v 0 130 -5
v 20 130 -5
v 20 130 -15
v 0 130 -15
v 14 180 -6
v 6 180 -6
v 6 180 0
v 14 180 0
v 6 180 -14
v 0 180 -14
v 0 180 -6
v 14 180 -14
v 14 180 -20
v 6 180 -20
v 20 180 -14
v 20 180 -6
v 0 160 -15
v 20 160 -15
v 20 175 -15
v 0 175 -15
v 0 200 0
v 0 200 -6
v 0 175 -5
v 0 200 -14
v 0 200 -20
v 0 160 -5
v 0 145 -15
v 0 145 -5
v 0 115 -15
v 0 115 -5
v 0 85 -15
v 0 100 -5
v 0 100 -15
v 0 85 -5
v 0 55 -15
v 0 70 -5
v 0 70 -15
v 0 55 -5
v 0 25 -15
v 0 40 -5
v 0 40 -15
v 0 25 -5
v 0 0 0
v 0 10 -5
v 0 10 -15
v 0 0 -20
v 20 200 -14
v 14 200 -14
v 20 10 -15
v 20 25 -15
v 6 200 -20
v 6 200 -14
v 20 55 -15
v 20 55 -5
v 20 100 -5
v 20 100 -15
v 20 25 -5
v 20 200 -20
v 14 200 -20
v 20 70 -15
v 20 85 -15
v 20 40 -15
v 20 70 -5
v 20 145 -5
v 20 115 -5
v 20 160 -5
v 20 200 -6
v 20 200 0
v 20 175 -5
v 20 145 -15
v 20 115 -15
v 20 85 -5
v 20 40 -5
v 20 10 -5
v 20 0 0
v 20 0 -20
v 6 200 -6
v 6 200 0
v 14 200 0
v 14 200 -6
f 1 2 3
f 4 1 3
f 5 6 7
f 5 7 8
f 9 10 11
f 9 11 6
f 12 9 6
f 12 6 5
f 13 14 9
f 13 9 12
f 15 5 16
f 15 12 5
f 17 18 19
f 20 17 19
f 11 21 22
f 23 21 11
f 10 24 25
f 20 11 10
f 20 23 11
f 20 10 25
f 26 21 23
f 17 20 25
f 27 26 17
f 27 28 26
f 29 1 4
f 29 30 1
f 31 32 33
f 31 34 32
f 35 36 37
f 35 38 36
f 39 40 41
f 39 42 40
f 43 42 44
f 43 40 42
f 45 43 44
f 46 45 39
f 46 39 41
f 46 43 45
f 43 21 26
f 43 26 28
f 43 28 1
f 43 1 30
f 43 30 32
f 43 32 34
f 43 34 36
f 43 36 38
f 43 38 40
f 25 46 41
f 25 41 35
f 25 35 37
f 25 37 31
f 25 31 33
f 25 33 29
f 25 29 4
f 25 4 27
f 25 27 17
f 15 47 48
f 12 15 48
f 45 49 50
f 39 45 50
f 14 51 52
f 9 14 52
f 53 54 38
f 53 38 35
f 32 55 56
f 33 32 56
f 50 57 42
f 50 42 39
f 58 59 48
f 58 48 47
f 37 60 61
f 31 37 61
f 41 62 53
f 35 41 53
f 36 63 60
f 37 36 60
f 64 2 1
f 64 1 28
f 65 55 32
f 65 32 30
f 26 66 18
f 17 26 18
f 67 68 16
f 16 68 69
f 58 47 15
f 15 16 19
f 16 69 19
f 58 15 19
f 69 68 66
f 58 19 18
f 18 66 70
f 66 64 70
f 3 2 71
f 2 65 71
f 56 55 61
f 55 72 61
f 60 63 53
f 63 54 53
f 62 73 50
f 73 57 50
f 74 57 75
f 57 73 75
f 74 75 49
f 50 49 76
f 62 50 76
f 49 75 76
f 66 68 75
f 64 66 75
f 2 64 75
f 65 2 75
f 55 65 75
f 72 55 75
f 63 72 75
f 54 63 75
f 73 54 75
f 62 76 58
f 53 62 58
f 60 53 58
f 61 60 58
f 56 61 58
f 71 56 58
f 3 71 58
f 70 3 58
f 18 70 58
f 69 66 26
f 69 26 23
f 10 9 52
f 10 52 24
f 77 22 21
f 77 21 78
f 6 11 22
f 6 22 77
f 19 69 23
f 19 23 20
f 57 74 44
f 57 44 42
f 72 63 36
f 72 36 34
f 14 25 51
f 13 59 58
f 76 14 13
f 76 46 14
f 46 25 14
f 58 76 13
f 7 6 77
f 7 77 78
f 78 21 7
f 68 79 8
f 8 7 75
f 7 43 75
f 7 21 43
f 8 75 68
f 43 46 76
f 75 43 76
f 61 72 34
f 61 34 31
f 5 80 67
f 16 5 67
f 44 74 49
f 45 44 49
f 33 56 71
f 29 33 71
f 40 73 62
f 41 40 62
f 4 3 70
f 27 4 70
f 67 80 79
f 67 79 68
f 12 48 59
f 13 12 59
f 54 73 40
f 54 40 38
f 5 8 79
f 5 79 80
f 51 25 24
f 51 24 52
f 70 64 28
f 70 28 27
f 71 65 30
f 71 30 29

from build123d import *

# Parameters (mm, degrees)
SKETCH4_W           = 20
SKETCH4_H           = 20
BOSS_EXTRUDE2_DEPTH = 200
CUT_EXTRUDE3_DEPTH  = 20
SKETCH6_W           = 10
SKETCH6_H           = 15
CUT_EXTRUDE5_DEPTH  = 21


with BuildPart() as part:
    # Sketch4 → Boss-Extrude2 (new body)
    with BuildSketch(Plane(origin=(0, 0, 0), x_dir=(1, 0, 0), z_dir=(0, 1, 0))):
        with Locations((10, 10)):
            Rectangle(SKETCH4_W, SKETCH4_H)
    extrude(amount=BOSS_EXTRUDE2_DEPTH)

    # Sketch5 → Cut-Extrude3 (cut)
    with BuildSketch(Plane(origin=(0, 200, 0), x_dir=(1, 0, 0), z_dir=(0, 1, 0))):
        Polygon((14, 20), (6, 20), (6, 14), (0, 14), (0, 6), (6, 6), (6, 0), (14, 0), (14, 6), (20, 6), (20, 14), (14, 14), align=None)
    extrude(amount=-CUT_EXTRUDE3_DEPTH, mode=Mode.SUBTRACT)

    # Sketch6 → Cut-Extrude5 (cut, through all)
    with BuildSketch(Plane(origin=(20, 0, 0), x_dir=(0, 0, -1), z_dir=(1, 0, 0))):
        with Locations((10, 17.5)):
            Rectangle(SKETCH6_W, SKETCH6_H)
        with Locations((10, 47.5)):
            Rectangle(SKETCH6_W, SKETCH6_H)
        with Locations((10, 77.5)):
            Rectangle(SKETCH6_W, SKETCH6_H)
        with Locations((10, 107.5)):
            Rectangle(SKETCH6_W, SKETCH6_H)
        with Locations((10, 137.5)):
            Rectangle(SKETCH6_W, SKETCH6_H)
        with Locations((10, 167.5)):
            Rectangle(SKETCH6_W, SKETCH6_H)
    extrude(amount=-CUT_EXTRUDE5_DEPTH, mode=Mode.SUBTRACT)


solid = part.part
